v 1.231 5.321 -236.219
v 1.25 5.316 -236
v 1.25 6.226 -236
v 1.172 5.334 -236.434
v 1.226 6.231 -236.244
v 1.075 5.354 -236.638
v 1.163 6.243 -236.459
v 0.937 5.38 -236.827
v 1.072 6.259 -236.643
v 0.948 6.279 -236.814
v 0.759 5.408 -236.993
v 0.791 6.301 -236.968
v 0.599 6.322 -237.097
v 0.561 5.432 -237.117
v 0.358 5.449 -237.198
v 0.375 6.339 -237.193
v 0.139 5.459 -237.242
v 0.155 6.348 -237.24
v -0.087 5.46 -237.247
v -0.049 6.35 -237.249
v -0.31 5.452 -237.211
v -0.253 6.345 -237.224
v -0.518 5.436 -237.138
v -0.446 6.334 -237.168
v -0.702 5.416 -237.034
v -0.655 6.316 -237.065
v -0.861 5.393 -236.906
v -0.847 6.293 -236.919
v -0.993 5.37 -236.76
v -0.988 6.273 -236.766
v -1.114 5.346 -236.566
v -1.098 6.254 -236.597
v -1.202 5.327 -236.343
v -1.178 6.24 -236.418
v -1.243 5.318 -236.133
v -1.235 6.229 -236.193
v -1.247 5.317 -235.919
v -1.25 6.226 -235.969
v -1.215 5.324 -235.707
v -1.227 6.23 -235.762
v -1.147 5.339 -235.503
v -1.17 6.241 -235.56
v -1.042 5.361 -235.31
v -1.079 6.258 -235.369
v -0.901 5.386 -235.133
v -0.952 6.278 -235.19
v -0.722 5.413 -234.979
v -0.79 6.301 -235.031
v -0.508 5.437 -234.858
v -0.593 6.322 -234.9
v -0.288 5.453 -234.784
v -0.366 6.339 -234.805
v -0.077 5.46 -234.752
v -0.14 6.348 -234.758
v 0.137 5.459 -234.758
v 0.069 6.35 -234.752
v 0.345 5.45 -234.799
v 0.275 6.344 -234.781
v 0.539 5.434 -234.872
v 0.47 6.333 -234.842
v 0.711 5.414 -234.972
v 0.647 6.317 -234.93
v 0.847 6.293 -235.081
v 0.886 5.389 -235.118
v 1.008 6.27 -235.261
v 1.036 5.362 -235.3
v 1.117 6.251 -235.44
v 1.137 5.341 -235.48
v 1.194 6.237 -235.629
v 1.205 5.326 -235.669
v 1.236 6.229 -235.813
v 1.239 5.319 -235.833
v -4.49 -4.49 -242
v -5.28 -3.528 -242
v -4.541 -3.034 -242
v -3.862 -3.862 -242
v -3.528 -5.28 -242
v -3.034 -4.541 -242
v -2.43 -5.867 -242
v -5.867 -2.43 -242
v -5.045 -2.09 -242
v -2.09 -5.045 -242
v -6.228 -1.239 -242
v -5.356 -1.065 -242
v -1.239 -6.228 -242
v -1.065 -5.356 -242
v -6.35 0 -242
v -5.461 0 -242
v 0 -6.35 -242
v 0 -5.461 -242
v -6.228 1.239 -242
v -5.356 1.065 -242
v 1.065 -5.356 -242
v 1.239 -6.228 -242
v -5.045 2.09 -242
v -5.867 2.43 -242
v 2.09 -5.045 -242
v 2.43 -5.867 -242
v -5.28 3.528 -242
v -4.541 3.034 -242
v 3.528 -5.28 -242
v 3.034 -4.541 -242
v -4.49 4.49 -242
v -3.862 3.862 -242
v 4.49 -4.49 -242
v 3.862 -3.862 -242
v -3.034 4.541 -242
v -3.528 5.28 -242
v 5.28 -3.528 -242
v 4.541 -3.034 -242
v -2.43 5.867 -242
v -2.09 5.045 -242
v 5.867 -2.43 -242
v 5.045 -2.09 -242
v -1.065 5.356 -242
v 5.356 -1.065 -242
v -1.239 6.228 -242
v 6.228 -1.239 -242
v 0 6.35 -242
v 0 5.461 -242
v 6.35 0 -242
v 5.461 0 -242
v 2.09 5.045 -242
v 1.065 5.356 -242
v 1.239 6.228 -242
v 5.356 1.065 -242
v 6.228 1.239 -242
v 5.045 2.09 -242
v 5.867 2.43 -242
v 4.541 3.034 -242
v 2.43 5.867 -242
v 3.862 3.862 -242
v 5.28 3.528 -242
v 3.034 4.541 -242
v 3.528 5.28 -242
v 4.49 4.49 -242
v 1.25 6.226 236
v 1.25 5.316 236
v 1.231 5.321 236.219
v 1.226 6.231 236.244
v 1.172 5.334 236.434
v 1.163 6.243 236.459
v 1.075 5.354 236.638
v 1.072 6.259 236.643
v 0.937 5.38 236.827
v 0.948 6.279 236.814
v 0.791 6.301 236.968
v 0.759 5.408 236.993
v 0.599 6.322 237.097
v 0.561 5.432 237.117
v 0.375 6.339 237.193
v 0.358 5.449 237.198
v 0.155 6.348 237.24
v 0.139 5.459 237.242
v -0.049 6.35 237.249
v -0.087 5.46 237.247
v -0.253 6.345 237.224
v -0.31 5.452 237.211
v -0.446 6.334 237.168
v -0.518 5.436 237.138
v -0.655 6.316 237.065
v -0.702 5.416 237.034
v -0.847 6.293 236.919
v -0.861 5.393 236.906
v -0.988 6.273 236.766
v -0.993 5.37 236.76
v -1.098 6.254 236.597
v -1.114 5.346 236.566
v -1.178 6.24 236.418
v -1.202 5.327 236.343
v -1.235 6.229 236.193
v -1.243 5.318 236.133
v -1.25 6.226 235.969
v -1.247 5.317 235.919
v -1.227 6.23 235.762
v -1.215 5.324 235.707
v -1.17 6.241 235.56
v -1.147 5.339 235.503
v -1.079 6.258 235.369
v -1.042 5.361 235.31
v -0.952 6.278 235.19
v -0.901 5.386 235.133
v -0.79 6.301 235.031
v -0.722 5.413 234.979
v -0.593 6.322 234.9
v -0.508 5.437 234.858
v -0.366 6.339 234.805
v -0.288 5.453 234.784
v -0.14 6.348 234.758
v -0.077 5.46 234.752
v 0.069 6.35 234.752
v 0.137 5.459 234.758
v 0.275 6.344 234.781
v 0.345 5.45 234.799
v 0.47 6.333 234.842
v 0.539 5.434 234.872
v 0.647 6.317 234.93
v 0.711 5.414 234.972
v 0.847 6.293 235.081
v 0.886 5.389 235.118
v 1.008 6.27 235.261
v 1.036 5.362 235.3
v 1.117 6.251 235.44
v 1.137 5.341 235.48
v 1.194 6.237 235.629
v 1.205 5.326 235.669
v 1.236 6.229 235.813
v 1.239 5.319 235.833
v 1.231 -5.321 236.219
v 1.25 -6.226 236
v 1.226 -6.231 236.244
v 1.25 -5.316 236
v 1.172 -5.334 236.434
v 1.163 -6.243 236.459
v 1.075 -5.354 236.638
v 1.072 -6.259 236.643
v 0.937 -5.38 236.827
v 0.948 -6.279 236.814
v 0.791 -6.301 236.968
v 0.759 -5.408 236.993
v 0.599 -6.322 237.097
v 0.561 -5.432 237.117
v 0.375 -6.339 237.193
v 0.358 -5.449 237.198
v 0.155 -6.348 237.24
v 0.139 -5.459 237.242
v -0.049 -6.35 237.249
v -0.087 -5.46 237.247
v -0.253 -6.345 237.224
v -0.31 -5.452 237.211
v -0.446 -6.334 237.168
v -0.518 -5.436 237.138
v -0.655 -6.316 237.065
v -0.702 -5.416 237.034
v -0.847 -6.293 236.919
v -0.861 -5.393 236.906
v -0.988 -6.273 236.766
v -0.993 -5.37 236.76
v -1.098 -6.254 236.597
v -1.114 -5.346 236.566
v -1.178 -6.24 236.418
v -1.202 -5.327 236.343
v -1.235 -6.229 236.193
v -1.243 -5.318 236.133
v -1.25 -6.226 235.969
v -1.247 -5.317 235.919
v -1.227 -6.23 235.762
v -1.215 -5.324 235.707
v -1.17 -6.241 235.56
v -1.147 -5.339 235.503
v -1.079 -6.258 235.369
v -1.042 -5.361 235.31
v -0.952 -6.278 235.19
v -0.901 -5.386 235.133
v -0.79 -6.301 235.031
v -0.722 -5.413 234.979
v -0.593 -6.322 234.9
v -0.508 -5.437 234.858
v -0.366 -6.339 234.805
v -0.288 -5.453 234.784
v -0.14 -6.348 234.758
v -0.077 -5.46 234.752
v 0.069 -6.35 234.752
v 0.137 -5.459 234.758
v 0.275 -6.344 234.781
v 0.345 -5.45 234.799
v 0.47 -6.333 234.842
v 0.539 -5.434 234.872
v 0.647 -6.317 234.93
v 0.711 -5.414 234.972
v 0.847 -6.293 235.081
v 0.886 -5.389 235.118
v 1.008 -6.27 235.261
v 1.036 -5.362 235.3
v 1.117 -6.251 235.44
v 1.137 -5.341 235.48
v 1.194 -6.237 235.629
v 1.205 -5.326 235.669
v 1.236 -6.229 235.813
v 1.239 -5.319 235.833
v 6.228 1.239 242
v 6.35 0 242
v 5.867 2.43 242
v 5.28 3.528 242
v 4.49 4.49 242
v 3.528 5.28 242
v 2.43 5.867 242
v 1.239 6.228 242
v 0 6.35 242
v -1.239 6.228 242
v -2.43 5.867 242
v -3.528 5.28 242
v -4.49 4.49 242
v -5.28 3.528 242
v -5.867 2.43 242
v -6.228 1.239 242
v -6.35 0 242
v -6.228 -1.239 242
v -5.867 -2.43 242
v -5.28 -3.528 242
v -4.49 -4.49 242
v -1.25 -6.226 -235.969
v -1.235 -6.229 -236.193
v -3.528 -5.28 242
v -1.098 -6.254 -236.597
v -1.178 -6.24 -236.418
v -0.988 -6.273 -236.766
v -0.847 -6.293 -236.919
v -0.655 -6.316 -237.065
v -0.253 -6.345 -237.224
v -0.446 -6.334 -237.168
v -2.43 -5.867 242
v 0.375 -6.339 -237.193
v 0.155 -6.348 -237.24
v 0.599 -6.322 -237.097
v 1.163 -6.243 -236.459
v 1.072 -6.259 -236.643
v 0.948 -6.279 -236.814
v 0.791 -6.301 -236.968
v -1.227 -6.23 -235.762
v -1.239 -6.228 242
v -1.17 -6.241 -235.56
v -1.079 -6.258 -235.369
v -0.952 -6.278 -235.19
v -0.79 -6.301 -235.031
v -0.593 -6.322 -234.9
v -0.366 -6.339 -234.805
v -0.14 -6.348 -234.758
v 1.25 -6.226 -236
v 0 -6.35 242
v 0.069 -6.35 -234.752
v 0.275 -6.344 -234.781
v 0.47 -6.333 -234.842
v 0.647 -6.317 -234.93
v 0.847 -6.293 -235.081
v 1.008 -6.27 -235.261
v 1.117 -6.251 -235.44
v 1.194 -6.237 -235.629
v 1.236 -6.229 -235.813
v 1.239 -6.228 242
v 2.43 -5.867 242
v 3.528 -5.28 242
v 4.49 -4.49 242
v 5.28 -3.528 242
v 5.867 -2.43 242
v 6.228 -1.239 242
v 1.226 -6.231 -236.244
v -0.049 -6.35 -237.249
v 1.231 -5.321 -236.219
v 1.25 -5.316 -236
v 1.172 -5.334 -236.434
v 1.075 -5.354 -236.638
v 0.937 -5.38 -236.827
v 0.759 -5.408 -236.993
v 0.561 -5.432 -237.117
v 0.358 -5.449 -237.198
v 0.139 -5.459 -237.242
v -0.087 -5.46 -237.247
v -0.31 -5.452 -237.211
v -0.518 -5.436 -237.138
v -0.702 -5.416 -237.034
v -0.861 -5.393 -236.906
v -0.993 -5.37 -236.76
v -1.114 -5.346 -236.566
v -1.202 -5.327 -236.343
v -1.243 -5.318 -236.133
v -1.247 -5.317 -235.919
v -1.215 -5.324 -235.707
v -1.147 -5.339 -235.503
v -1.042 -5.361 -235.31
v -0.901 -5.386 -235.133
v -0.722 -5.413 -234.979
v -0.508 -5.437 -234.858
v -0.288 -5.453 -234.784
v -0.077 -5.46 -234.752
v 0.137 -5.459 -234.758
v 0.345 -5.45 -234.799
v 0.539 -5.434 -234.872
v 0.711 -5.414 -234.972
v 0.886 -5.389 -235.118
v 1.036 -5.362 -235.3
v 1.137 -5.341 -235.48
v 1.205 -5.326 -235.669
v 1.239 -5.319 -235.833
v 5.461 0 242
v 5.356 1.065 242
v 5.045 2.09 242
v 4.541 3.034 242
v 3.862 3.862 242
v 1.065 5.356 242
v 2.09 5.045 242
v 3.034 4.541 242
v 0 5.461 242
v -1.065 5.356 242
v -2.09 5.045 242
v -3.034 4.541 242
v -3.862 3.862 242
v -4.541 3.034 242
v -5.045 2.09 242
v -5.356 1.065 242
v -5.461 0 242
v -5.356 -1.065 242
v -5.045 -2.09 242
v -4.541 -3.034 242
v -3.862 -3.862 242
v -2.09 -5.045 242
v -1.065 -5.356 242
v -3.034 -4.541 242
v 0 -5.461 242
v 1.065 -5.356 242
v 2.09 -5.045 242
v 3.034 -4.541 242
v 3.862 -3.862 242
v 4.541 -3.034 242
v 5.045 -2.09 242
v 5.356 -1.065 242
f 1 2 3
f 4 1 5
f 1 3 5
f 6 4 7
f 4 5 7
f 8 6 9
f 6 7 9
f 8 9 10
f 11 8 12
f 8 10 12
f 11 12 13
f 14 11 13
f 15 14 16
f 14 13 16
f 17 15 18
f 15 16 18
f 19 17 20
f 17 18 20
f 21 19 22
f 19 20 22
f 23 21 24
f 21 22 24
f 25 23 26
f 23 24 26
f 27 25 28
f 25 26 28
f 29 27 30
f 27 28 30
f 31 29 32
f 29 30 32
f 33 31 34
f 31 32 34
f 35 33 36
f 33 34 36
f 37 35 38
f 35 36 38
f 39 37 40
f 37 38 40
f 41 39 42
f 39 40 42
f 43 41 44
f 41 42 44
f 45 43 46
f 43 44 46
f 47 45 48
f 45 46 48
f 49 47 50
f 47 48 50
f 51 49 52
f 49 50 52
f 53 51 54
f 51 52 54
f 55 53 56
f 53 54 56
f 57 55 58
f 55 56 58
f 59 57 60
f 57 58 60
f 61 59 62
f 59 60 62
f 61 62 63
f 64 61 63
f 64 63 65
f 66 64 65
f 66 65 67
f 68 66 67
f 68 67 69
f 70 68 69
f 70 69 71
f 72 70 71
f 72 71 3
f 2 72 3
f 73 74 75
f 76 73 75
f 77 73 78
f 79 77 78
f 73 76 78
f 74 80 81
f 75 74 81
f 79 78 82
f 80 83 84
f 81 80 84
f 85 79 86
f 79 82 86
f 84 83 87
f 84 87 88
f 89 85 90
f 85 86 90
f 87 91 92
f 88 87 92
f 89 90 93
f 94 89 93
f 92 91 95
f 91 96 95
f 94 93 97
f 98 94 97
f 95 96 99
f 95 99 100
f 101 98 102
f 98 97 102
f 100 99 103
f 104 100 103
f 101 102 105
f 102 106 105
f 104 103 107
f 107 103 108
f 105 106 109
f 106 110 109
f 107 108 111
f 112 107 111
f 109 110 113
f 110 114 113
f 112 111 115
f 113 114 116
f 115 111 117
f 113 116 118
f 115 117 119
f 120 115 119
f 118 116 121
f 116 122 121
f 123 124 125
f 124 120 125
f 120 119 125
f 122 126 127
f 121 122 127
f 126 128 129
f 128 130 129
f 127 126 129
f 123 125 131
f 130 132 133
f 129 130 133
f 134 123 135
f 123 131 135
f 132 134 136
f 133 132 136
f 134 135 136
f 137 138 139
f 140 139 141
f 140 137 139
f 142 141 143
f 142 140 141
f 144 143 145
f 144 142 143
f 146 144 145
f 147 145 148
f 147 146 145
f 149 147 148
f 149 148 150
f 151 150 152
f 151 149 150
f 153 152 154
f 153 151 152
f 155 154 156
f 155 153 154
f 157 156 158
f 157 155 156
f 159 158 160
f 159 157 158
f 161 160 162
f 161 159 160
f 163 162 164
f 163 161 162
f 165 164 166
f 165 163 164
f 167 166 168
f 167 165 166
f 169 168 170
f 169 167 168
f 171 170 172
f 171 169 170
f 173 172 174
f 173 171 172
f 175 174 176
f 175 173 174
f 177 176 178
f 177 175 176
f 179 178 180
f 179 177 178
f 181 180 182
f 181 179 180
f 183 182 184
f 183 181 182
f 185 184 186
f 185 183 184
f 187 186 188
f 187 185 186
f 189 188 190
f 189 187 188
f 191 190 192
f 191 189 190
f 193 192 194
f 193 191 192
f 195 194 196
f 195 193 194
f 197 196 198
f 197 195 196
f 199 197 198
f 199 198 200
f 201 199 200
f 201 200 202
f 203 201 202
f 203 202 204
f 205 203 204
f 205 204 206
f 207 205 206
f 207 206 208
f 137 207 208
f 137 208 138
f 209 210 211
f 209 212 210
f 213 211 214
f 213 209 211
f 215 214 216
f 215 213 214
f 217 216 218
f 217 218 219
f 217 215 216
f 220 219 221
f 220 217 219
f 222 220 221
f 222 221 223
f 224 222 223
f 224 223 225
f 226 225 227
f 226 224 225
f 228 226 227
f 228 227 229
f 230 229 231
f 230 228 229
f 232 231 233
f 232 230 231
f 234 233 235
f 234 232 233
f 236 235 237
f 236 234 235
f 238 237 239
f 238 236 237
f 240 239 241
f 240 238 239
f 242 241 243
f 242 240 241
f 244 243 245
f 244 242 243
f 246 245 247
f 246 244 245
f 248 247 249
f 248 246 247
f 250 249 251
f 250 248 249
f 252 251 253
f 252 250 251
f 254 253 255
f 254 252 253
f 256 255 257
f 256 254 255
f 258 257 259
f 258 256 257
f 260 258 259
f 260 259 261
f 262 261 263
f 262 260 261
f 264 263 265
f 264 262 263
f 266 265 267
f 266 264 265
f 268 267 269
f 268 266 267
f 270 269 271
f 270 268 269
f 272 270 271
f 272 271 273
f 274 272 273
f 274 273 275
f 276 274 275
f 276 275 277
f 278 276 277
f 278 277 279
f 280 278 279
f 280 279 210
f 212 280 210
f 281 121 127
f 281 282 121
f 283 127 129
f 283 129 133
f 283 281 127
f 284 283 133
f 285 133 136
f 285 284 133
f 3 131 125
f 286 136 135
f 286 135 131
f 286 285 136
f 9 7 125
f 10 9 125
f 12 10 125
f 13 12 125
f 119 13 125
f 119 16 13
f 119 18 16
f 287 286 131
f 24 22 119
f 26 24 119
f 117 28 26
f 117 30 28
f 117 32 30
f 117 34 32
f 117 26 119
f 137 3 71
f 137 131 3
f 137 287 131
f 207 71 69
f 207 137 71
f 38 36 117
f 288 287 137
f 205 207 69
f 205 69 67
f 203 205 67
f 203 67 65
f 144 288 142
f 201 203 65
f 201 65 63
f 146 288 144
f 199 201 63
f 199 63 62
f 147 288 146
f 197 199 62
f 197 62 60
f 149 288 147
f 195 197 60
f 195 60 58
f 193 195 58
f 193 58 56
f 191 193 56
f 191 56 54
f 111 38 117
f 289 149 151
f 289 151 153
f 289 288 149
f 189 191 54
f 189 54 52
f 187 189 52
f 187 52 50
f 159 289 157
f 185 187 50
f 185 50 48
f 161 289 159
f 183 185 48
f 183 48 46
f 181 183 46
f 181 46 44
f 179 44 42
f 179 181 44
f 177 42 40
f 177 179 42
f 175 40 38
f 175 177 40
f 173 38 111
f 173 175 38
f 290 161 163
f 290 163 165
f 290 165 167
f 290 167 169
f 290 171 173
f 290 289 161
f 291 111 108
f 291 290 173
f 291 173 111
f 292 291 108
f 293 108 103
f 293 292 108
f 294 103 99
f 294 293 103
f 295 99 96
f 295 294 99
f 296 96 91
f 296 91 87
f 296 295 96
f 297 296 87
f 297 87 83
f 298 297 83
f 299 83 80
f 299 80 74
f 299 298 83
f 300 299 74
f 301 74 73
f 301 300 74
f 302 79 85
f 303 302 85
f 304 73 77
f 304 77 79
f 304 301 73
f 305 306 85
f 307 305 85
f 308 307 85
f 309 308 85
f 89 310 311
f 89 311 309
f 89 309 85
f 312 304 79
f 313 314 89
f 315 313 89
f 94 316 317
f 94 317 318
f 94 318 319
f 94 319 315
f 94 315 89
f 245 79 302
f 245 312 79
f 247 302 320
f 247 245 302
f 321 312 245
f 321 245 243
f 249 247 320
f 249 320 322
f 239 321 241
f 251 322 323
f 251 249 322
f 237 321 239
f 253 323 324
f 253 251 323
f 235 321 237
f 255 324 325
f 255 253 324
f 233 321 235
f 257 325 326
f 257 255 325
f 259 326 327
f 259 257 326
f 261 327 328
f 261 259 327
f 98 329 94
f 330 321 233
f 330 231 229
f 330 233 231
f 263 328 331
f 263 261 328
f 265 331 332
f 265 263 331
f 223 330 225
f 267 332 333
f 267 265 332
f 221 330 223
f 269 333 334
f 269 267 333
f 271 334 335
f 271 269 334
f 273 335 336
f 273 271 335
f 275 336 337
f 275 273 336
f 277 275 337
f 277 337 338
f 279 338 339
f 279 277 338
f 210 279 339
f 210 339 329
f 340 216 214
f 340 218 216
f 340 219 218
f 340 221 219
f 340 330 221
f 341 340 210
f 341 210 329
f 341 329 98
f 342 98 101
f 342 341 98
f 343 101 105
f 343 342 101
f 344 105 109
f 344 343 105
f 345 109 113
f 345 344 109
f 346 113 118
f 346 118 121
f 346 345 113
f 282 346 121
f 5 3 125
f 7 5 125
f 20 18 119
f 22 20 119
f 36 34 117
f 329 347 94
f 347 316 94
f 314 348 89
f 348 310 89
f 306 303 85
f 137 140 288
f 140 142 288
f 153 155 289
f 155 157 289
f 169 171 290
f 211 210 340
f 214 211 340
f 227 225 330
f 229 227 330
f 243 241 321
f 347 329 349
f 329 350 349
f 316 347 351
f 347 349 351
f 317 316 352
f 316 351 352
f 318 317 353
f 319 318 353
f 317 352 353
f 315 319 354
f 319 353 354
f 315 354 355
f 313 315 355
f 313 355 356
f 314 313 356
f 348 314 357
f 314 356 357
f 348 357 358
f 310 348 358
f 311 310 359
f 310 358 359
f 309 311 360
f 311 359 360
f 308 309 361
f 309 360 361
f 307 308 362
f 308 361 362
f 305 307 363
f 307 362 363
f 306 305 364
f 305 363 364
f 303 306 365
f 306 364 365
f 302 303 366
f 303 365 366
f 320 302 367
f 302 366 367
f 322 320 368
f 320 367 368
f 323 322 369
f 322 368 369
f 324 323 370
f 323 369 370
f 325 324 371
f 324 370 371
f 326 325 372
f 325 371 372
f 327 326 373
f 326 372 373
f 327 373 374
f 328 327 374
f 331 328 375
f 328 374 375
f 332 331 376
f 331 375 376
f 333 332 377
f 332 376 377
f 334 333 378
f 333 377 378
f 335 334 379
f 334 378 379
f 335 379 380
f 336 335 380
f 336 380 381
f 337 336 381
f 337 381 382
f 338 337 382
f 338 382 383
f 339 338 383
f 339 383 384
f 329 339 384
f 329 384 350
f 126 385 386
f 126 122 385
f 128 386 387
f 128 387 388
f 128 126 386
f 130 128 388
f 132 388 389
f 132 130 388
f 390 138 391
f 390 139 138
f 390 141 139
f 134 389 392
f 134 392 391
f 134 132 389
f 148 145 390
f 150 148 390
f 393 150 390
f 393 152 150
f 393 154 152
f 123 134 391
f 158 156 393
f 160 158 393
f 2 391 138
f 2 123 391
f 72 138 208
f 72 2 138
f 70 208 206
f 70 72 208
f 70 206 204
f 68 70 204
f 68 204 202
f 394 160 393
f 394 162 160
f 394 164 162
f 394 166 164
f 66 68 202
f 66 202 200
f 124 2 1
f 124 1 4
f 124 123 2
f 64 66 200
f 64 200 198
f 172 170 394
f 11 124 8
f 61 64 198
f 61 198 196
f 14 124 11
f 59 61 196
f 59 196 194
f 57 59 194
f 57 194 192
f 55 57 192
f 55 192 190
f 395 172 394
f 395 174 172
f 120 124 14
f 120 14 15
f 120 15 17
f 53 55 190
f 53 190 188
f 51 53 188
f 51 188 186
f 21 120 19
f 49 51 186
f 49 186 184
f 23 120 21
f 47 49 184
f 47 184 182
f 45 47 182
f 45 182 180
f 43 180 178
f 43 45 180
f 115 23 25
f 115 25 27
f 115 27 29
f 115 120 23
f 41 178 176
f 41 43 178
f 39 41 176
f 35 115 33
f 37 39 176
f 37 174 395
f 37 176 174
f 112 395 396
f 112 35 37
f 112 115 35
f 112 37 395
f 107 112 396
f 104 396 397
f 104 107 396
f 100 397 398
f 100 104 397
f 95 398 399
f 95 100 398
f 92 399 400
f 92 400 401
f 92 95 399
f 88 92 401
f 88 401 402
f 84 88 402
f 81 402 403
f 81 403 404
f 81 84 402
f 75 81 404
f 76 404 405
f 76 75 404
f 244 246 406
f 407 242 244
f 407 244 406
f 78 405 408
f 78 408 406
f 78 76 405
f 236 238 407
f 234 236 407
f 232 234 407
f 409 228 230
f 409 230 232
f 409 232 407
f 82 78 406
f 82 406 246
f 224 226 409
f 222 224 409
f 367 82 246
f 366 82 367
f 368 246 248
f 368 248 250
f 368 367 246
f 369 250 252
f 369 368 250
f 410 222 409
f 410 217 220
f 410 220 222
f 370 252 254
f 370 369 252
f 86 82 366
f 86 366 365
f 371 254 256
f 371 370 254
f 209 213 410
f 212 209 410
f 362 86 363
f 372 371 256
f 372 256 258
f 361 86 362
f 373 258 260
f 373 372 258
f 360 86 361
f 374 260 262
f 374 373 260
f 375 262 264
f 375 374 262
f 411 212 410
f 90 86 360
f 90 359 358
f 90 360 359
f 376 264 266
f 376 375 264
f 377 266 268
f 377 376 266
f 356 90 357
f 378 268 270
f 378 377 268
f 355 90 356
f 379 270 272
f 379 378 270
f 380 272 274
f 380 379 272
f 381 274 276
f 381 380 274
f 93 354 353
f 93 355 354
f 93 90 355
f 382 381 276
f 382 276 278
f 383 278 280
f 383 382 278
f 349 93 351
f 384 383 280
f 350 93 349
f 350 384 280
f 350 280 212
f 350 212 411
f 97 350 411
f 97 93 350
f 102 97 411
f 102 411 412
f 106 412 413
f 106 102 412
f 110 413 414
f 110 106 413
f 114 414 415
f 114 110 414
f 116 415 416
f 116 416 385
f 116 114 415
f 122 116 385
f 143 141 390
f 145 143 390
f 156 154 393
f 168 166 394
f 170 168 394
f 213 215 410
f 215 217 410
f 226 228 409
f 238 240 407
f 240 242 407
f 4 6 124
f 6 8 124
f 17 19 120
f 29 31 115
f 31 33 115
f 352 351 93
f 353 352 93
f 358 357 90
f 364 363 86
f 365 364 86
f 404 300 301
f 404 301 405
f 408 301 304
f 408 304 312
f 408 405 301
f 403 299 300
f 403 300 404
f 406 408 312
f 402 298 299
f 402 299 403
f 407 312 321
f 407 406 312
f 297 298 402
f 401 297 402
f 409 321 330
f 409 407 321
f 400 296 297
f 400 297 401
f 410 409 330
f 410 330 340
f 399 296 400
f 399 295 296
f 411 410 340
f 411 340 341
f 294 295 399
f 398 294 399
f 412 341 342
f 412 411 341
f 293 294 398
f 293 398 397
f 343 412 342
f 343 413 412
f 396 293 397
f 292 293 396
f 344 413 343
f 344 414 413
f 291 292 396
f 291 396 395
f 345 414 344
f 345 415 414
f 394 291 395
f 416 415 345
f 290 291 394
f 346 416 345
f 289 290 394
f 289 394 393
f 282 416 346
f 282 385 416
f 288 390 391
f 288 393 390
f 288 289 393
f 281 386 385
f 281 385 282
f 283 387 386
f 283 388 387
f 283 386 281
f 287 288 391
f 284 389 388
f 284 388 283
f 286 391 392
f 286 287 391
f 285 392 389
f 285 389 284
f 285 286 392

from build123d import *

# Parameters (mm, degrees)
SKETCH1_R           = 6.35
SKETCH1_R_2         = 5.461
BOSS_EXTRUDE1_DEPTH = 242
SKETCH2_R           = 1.25
CUT_EXTRUDE1_DEPTH  = 7.35


with BuildPart() as part:
    # Sketch1 → Boss-Extrude1 (new body, symmetric)
    with BuildSketch(Plane.XY):
        Circle(SKETCH1_R)
        Circle(SKETCH1_R_2, mode=Mode.SUBTRACT)
    extrude(amount=BOSS_EXTRUDE1_DEPTH, both=True)

    # Sketch2 → Cut-Extrude1 (cut, symmetric)
    with BuildSketch(Plane(origin=(0, 0, 0), x_dir=(1, 0, 0), z_dir=(0, 1, 0))):
        with Locations((0, 236)):
            Circle(SKETCH2_R)
    cut_extrude1 = extrude(amount=CUT_EXTRUDE1_DEPTH, both=True, mode=Mode.SUBTRACT)

    # Mirror1: Cut-Extrude1 across plane
    add(cut_extrude1.mirror(Plane.XY), mode=Mode.SUBTRACT)


solid = part.part
